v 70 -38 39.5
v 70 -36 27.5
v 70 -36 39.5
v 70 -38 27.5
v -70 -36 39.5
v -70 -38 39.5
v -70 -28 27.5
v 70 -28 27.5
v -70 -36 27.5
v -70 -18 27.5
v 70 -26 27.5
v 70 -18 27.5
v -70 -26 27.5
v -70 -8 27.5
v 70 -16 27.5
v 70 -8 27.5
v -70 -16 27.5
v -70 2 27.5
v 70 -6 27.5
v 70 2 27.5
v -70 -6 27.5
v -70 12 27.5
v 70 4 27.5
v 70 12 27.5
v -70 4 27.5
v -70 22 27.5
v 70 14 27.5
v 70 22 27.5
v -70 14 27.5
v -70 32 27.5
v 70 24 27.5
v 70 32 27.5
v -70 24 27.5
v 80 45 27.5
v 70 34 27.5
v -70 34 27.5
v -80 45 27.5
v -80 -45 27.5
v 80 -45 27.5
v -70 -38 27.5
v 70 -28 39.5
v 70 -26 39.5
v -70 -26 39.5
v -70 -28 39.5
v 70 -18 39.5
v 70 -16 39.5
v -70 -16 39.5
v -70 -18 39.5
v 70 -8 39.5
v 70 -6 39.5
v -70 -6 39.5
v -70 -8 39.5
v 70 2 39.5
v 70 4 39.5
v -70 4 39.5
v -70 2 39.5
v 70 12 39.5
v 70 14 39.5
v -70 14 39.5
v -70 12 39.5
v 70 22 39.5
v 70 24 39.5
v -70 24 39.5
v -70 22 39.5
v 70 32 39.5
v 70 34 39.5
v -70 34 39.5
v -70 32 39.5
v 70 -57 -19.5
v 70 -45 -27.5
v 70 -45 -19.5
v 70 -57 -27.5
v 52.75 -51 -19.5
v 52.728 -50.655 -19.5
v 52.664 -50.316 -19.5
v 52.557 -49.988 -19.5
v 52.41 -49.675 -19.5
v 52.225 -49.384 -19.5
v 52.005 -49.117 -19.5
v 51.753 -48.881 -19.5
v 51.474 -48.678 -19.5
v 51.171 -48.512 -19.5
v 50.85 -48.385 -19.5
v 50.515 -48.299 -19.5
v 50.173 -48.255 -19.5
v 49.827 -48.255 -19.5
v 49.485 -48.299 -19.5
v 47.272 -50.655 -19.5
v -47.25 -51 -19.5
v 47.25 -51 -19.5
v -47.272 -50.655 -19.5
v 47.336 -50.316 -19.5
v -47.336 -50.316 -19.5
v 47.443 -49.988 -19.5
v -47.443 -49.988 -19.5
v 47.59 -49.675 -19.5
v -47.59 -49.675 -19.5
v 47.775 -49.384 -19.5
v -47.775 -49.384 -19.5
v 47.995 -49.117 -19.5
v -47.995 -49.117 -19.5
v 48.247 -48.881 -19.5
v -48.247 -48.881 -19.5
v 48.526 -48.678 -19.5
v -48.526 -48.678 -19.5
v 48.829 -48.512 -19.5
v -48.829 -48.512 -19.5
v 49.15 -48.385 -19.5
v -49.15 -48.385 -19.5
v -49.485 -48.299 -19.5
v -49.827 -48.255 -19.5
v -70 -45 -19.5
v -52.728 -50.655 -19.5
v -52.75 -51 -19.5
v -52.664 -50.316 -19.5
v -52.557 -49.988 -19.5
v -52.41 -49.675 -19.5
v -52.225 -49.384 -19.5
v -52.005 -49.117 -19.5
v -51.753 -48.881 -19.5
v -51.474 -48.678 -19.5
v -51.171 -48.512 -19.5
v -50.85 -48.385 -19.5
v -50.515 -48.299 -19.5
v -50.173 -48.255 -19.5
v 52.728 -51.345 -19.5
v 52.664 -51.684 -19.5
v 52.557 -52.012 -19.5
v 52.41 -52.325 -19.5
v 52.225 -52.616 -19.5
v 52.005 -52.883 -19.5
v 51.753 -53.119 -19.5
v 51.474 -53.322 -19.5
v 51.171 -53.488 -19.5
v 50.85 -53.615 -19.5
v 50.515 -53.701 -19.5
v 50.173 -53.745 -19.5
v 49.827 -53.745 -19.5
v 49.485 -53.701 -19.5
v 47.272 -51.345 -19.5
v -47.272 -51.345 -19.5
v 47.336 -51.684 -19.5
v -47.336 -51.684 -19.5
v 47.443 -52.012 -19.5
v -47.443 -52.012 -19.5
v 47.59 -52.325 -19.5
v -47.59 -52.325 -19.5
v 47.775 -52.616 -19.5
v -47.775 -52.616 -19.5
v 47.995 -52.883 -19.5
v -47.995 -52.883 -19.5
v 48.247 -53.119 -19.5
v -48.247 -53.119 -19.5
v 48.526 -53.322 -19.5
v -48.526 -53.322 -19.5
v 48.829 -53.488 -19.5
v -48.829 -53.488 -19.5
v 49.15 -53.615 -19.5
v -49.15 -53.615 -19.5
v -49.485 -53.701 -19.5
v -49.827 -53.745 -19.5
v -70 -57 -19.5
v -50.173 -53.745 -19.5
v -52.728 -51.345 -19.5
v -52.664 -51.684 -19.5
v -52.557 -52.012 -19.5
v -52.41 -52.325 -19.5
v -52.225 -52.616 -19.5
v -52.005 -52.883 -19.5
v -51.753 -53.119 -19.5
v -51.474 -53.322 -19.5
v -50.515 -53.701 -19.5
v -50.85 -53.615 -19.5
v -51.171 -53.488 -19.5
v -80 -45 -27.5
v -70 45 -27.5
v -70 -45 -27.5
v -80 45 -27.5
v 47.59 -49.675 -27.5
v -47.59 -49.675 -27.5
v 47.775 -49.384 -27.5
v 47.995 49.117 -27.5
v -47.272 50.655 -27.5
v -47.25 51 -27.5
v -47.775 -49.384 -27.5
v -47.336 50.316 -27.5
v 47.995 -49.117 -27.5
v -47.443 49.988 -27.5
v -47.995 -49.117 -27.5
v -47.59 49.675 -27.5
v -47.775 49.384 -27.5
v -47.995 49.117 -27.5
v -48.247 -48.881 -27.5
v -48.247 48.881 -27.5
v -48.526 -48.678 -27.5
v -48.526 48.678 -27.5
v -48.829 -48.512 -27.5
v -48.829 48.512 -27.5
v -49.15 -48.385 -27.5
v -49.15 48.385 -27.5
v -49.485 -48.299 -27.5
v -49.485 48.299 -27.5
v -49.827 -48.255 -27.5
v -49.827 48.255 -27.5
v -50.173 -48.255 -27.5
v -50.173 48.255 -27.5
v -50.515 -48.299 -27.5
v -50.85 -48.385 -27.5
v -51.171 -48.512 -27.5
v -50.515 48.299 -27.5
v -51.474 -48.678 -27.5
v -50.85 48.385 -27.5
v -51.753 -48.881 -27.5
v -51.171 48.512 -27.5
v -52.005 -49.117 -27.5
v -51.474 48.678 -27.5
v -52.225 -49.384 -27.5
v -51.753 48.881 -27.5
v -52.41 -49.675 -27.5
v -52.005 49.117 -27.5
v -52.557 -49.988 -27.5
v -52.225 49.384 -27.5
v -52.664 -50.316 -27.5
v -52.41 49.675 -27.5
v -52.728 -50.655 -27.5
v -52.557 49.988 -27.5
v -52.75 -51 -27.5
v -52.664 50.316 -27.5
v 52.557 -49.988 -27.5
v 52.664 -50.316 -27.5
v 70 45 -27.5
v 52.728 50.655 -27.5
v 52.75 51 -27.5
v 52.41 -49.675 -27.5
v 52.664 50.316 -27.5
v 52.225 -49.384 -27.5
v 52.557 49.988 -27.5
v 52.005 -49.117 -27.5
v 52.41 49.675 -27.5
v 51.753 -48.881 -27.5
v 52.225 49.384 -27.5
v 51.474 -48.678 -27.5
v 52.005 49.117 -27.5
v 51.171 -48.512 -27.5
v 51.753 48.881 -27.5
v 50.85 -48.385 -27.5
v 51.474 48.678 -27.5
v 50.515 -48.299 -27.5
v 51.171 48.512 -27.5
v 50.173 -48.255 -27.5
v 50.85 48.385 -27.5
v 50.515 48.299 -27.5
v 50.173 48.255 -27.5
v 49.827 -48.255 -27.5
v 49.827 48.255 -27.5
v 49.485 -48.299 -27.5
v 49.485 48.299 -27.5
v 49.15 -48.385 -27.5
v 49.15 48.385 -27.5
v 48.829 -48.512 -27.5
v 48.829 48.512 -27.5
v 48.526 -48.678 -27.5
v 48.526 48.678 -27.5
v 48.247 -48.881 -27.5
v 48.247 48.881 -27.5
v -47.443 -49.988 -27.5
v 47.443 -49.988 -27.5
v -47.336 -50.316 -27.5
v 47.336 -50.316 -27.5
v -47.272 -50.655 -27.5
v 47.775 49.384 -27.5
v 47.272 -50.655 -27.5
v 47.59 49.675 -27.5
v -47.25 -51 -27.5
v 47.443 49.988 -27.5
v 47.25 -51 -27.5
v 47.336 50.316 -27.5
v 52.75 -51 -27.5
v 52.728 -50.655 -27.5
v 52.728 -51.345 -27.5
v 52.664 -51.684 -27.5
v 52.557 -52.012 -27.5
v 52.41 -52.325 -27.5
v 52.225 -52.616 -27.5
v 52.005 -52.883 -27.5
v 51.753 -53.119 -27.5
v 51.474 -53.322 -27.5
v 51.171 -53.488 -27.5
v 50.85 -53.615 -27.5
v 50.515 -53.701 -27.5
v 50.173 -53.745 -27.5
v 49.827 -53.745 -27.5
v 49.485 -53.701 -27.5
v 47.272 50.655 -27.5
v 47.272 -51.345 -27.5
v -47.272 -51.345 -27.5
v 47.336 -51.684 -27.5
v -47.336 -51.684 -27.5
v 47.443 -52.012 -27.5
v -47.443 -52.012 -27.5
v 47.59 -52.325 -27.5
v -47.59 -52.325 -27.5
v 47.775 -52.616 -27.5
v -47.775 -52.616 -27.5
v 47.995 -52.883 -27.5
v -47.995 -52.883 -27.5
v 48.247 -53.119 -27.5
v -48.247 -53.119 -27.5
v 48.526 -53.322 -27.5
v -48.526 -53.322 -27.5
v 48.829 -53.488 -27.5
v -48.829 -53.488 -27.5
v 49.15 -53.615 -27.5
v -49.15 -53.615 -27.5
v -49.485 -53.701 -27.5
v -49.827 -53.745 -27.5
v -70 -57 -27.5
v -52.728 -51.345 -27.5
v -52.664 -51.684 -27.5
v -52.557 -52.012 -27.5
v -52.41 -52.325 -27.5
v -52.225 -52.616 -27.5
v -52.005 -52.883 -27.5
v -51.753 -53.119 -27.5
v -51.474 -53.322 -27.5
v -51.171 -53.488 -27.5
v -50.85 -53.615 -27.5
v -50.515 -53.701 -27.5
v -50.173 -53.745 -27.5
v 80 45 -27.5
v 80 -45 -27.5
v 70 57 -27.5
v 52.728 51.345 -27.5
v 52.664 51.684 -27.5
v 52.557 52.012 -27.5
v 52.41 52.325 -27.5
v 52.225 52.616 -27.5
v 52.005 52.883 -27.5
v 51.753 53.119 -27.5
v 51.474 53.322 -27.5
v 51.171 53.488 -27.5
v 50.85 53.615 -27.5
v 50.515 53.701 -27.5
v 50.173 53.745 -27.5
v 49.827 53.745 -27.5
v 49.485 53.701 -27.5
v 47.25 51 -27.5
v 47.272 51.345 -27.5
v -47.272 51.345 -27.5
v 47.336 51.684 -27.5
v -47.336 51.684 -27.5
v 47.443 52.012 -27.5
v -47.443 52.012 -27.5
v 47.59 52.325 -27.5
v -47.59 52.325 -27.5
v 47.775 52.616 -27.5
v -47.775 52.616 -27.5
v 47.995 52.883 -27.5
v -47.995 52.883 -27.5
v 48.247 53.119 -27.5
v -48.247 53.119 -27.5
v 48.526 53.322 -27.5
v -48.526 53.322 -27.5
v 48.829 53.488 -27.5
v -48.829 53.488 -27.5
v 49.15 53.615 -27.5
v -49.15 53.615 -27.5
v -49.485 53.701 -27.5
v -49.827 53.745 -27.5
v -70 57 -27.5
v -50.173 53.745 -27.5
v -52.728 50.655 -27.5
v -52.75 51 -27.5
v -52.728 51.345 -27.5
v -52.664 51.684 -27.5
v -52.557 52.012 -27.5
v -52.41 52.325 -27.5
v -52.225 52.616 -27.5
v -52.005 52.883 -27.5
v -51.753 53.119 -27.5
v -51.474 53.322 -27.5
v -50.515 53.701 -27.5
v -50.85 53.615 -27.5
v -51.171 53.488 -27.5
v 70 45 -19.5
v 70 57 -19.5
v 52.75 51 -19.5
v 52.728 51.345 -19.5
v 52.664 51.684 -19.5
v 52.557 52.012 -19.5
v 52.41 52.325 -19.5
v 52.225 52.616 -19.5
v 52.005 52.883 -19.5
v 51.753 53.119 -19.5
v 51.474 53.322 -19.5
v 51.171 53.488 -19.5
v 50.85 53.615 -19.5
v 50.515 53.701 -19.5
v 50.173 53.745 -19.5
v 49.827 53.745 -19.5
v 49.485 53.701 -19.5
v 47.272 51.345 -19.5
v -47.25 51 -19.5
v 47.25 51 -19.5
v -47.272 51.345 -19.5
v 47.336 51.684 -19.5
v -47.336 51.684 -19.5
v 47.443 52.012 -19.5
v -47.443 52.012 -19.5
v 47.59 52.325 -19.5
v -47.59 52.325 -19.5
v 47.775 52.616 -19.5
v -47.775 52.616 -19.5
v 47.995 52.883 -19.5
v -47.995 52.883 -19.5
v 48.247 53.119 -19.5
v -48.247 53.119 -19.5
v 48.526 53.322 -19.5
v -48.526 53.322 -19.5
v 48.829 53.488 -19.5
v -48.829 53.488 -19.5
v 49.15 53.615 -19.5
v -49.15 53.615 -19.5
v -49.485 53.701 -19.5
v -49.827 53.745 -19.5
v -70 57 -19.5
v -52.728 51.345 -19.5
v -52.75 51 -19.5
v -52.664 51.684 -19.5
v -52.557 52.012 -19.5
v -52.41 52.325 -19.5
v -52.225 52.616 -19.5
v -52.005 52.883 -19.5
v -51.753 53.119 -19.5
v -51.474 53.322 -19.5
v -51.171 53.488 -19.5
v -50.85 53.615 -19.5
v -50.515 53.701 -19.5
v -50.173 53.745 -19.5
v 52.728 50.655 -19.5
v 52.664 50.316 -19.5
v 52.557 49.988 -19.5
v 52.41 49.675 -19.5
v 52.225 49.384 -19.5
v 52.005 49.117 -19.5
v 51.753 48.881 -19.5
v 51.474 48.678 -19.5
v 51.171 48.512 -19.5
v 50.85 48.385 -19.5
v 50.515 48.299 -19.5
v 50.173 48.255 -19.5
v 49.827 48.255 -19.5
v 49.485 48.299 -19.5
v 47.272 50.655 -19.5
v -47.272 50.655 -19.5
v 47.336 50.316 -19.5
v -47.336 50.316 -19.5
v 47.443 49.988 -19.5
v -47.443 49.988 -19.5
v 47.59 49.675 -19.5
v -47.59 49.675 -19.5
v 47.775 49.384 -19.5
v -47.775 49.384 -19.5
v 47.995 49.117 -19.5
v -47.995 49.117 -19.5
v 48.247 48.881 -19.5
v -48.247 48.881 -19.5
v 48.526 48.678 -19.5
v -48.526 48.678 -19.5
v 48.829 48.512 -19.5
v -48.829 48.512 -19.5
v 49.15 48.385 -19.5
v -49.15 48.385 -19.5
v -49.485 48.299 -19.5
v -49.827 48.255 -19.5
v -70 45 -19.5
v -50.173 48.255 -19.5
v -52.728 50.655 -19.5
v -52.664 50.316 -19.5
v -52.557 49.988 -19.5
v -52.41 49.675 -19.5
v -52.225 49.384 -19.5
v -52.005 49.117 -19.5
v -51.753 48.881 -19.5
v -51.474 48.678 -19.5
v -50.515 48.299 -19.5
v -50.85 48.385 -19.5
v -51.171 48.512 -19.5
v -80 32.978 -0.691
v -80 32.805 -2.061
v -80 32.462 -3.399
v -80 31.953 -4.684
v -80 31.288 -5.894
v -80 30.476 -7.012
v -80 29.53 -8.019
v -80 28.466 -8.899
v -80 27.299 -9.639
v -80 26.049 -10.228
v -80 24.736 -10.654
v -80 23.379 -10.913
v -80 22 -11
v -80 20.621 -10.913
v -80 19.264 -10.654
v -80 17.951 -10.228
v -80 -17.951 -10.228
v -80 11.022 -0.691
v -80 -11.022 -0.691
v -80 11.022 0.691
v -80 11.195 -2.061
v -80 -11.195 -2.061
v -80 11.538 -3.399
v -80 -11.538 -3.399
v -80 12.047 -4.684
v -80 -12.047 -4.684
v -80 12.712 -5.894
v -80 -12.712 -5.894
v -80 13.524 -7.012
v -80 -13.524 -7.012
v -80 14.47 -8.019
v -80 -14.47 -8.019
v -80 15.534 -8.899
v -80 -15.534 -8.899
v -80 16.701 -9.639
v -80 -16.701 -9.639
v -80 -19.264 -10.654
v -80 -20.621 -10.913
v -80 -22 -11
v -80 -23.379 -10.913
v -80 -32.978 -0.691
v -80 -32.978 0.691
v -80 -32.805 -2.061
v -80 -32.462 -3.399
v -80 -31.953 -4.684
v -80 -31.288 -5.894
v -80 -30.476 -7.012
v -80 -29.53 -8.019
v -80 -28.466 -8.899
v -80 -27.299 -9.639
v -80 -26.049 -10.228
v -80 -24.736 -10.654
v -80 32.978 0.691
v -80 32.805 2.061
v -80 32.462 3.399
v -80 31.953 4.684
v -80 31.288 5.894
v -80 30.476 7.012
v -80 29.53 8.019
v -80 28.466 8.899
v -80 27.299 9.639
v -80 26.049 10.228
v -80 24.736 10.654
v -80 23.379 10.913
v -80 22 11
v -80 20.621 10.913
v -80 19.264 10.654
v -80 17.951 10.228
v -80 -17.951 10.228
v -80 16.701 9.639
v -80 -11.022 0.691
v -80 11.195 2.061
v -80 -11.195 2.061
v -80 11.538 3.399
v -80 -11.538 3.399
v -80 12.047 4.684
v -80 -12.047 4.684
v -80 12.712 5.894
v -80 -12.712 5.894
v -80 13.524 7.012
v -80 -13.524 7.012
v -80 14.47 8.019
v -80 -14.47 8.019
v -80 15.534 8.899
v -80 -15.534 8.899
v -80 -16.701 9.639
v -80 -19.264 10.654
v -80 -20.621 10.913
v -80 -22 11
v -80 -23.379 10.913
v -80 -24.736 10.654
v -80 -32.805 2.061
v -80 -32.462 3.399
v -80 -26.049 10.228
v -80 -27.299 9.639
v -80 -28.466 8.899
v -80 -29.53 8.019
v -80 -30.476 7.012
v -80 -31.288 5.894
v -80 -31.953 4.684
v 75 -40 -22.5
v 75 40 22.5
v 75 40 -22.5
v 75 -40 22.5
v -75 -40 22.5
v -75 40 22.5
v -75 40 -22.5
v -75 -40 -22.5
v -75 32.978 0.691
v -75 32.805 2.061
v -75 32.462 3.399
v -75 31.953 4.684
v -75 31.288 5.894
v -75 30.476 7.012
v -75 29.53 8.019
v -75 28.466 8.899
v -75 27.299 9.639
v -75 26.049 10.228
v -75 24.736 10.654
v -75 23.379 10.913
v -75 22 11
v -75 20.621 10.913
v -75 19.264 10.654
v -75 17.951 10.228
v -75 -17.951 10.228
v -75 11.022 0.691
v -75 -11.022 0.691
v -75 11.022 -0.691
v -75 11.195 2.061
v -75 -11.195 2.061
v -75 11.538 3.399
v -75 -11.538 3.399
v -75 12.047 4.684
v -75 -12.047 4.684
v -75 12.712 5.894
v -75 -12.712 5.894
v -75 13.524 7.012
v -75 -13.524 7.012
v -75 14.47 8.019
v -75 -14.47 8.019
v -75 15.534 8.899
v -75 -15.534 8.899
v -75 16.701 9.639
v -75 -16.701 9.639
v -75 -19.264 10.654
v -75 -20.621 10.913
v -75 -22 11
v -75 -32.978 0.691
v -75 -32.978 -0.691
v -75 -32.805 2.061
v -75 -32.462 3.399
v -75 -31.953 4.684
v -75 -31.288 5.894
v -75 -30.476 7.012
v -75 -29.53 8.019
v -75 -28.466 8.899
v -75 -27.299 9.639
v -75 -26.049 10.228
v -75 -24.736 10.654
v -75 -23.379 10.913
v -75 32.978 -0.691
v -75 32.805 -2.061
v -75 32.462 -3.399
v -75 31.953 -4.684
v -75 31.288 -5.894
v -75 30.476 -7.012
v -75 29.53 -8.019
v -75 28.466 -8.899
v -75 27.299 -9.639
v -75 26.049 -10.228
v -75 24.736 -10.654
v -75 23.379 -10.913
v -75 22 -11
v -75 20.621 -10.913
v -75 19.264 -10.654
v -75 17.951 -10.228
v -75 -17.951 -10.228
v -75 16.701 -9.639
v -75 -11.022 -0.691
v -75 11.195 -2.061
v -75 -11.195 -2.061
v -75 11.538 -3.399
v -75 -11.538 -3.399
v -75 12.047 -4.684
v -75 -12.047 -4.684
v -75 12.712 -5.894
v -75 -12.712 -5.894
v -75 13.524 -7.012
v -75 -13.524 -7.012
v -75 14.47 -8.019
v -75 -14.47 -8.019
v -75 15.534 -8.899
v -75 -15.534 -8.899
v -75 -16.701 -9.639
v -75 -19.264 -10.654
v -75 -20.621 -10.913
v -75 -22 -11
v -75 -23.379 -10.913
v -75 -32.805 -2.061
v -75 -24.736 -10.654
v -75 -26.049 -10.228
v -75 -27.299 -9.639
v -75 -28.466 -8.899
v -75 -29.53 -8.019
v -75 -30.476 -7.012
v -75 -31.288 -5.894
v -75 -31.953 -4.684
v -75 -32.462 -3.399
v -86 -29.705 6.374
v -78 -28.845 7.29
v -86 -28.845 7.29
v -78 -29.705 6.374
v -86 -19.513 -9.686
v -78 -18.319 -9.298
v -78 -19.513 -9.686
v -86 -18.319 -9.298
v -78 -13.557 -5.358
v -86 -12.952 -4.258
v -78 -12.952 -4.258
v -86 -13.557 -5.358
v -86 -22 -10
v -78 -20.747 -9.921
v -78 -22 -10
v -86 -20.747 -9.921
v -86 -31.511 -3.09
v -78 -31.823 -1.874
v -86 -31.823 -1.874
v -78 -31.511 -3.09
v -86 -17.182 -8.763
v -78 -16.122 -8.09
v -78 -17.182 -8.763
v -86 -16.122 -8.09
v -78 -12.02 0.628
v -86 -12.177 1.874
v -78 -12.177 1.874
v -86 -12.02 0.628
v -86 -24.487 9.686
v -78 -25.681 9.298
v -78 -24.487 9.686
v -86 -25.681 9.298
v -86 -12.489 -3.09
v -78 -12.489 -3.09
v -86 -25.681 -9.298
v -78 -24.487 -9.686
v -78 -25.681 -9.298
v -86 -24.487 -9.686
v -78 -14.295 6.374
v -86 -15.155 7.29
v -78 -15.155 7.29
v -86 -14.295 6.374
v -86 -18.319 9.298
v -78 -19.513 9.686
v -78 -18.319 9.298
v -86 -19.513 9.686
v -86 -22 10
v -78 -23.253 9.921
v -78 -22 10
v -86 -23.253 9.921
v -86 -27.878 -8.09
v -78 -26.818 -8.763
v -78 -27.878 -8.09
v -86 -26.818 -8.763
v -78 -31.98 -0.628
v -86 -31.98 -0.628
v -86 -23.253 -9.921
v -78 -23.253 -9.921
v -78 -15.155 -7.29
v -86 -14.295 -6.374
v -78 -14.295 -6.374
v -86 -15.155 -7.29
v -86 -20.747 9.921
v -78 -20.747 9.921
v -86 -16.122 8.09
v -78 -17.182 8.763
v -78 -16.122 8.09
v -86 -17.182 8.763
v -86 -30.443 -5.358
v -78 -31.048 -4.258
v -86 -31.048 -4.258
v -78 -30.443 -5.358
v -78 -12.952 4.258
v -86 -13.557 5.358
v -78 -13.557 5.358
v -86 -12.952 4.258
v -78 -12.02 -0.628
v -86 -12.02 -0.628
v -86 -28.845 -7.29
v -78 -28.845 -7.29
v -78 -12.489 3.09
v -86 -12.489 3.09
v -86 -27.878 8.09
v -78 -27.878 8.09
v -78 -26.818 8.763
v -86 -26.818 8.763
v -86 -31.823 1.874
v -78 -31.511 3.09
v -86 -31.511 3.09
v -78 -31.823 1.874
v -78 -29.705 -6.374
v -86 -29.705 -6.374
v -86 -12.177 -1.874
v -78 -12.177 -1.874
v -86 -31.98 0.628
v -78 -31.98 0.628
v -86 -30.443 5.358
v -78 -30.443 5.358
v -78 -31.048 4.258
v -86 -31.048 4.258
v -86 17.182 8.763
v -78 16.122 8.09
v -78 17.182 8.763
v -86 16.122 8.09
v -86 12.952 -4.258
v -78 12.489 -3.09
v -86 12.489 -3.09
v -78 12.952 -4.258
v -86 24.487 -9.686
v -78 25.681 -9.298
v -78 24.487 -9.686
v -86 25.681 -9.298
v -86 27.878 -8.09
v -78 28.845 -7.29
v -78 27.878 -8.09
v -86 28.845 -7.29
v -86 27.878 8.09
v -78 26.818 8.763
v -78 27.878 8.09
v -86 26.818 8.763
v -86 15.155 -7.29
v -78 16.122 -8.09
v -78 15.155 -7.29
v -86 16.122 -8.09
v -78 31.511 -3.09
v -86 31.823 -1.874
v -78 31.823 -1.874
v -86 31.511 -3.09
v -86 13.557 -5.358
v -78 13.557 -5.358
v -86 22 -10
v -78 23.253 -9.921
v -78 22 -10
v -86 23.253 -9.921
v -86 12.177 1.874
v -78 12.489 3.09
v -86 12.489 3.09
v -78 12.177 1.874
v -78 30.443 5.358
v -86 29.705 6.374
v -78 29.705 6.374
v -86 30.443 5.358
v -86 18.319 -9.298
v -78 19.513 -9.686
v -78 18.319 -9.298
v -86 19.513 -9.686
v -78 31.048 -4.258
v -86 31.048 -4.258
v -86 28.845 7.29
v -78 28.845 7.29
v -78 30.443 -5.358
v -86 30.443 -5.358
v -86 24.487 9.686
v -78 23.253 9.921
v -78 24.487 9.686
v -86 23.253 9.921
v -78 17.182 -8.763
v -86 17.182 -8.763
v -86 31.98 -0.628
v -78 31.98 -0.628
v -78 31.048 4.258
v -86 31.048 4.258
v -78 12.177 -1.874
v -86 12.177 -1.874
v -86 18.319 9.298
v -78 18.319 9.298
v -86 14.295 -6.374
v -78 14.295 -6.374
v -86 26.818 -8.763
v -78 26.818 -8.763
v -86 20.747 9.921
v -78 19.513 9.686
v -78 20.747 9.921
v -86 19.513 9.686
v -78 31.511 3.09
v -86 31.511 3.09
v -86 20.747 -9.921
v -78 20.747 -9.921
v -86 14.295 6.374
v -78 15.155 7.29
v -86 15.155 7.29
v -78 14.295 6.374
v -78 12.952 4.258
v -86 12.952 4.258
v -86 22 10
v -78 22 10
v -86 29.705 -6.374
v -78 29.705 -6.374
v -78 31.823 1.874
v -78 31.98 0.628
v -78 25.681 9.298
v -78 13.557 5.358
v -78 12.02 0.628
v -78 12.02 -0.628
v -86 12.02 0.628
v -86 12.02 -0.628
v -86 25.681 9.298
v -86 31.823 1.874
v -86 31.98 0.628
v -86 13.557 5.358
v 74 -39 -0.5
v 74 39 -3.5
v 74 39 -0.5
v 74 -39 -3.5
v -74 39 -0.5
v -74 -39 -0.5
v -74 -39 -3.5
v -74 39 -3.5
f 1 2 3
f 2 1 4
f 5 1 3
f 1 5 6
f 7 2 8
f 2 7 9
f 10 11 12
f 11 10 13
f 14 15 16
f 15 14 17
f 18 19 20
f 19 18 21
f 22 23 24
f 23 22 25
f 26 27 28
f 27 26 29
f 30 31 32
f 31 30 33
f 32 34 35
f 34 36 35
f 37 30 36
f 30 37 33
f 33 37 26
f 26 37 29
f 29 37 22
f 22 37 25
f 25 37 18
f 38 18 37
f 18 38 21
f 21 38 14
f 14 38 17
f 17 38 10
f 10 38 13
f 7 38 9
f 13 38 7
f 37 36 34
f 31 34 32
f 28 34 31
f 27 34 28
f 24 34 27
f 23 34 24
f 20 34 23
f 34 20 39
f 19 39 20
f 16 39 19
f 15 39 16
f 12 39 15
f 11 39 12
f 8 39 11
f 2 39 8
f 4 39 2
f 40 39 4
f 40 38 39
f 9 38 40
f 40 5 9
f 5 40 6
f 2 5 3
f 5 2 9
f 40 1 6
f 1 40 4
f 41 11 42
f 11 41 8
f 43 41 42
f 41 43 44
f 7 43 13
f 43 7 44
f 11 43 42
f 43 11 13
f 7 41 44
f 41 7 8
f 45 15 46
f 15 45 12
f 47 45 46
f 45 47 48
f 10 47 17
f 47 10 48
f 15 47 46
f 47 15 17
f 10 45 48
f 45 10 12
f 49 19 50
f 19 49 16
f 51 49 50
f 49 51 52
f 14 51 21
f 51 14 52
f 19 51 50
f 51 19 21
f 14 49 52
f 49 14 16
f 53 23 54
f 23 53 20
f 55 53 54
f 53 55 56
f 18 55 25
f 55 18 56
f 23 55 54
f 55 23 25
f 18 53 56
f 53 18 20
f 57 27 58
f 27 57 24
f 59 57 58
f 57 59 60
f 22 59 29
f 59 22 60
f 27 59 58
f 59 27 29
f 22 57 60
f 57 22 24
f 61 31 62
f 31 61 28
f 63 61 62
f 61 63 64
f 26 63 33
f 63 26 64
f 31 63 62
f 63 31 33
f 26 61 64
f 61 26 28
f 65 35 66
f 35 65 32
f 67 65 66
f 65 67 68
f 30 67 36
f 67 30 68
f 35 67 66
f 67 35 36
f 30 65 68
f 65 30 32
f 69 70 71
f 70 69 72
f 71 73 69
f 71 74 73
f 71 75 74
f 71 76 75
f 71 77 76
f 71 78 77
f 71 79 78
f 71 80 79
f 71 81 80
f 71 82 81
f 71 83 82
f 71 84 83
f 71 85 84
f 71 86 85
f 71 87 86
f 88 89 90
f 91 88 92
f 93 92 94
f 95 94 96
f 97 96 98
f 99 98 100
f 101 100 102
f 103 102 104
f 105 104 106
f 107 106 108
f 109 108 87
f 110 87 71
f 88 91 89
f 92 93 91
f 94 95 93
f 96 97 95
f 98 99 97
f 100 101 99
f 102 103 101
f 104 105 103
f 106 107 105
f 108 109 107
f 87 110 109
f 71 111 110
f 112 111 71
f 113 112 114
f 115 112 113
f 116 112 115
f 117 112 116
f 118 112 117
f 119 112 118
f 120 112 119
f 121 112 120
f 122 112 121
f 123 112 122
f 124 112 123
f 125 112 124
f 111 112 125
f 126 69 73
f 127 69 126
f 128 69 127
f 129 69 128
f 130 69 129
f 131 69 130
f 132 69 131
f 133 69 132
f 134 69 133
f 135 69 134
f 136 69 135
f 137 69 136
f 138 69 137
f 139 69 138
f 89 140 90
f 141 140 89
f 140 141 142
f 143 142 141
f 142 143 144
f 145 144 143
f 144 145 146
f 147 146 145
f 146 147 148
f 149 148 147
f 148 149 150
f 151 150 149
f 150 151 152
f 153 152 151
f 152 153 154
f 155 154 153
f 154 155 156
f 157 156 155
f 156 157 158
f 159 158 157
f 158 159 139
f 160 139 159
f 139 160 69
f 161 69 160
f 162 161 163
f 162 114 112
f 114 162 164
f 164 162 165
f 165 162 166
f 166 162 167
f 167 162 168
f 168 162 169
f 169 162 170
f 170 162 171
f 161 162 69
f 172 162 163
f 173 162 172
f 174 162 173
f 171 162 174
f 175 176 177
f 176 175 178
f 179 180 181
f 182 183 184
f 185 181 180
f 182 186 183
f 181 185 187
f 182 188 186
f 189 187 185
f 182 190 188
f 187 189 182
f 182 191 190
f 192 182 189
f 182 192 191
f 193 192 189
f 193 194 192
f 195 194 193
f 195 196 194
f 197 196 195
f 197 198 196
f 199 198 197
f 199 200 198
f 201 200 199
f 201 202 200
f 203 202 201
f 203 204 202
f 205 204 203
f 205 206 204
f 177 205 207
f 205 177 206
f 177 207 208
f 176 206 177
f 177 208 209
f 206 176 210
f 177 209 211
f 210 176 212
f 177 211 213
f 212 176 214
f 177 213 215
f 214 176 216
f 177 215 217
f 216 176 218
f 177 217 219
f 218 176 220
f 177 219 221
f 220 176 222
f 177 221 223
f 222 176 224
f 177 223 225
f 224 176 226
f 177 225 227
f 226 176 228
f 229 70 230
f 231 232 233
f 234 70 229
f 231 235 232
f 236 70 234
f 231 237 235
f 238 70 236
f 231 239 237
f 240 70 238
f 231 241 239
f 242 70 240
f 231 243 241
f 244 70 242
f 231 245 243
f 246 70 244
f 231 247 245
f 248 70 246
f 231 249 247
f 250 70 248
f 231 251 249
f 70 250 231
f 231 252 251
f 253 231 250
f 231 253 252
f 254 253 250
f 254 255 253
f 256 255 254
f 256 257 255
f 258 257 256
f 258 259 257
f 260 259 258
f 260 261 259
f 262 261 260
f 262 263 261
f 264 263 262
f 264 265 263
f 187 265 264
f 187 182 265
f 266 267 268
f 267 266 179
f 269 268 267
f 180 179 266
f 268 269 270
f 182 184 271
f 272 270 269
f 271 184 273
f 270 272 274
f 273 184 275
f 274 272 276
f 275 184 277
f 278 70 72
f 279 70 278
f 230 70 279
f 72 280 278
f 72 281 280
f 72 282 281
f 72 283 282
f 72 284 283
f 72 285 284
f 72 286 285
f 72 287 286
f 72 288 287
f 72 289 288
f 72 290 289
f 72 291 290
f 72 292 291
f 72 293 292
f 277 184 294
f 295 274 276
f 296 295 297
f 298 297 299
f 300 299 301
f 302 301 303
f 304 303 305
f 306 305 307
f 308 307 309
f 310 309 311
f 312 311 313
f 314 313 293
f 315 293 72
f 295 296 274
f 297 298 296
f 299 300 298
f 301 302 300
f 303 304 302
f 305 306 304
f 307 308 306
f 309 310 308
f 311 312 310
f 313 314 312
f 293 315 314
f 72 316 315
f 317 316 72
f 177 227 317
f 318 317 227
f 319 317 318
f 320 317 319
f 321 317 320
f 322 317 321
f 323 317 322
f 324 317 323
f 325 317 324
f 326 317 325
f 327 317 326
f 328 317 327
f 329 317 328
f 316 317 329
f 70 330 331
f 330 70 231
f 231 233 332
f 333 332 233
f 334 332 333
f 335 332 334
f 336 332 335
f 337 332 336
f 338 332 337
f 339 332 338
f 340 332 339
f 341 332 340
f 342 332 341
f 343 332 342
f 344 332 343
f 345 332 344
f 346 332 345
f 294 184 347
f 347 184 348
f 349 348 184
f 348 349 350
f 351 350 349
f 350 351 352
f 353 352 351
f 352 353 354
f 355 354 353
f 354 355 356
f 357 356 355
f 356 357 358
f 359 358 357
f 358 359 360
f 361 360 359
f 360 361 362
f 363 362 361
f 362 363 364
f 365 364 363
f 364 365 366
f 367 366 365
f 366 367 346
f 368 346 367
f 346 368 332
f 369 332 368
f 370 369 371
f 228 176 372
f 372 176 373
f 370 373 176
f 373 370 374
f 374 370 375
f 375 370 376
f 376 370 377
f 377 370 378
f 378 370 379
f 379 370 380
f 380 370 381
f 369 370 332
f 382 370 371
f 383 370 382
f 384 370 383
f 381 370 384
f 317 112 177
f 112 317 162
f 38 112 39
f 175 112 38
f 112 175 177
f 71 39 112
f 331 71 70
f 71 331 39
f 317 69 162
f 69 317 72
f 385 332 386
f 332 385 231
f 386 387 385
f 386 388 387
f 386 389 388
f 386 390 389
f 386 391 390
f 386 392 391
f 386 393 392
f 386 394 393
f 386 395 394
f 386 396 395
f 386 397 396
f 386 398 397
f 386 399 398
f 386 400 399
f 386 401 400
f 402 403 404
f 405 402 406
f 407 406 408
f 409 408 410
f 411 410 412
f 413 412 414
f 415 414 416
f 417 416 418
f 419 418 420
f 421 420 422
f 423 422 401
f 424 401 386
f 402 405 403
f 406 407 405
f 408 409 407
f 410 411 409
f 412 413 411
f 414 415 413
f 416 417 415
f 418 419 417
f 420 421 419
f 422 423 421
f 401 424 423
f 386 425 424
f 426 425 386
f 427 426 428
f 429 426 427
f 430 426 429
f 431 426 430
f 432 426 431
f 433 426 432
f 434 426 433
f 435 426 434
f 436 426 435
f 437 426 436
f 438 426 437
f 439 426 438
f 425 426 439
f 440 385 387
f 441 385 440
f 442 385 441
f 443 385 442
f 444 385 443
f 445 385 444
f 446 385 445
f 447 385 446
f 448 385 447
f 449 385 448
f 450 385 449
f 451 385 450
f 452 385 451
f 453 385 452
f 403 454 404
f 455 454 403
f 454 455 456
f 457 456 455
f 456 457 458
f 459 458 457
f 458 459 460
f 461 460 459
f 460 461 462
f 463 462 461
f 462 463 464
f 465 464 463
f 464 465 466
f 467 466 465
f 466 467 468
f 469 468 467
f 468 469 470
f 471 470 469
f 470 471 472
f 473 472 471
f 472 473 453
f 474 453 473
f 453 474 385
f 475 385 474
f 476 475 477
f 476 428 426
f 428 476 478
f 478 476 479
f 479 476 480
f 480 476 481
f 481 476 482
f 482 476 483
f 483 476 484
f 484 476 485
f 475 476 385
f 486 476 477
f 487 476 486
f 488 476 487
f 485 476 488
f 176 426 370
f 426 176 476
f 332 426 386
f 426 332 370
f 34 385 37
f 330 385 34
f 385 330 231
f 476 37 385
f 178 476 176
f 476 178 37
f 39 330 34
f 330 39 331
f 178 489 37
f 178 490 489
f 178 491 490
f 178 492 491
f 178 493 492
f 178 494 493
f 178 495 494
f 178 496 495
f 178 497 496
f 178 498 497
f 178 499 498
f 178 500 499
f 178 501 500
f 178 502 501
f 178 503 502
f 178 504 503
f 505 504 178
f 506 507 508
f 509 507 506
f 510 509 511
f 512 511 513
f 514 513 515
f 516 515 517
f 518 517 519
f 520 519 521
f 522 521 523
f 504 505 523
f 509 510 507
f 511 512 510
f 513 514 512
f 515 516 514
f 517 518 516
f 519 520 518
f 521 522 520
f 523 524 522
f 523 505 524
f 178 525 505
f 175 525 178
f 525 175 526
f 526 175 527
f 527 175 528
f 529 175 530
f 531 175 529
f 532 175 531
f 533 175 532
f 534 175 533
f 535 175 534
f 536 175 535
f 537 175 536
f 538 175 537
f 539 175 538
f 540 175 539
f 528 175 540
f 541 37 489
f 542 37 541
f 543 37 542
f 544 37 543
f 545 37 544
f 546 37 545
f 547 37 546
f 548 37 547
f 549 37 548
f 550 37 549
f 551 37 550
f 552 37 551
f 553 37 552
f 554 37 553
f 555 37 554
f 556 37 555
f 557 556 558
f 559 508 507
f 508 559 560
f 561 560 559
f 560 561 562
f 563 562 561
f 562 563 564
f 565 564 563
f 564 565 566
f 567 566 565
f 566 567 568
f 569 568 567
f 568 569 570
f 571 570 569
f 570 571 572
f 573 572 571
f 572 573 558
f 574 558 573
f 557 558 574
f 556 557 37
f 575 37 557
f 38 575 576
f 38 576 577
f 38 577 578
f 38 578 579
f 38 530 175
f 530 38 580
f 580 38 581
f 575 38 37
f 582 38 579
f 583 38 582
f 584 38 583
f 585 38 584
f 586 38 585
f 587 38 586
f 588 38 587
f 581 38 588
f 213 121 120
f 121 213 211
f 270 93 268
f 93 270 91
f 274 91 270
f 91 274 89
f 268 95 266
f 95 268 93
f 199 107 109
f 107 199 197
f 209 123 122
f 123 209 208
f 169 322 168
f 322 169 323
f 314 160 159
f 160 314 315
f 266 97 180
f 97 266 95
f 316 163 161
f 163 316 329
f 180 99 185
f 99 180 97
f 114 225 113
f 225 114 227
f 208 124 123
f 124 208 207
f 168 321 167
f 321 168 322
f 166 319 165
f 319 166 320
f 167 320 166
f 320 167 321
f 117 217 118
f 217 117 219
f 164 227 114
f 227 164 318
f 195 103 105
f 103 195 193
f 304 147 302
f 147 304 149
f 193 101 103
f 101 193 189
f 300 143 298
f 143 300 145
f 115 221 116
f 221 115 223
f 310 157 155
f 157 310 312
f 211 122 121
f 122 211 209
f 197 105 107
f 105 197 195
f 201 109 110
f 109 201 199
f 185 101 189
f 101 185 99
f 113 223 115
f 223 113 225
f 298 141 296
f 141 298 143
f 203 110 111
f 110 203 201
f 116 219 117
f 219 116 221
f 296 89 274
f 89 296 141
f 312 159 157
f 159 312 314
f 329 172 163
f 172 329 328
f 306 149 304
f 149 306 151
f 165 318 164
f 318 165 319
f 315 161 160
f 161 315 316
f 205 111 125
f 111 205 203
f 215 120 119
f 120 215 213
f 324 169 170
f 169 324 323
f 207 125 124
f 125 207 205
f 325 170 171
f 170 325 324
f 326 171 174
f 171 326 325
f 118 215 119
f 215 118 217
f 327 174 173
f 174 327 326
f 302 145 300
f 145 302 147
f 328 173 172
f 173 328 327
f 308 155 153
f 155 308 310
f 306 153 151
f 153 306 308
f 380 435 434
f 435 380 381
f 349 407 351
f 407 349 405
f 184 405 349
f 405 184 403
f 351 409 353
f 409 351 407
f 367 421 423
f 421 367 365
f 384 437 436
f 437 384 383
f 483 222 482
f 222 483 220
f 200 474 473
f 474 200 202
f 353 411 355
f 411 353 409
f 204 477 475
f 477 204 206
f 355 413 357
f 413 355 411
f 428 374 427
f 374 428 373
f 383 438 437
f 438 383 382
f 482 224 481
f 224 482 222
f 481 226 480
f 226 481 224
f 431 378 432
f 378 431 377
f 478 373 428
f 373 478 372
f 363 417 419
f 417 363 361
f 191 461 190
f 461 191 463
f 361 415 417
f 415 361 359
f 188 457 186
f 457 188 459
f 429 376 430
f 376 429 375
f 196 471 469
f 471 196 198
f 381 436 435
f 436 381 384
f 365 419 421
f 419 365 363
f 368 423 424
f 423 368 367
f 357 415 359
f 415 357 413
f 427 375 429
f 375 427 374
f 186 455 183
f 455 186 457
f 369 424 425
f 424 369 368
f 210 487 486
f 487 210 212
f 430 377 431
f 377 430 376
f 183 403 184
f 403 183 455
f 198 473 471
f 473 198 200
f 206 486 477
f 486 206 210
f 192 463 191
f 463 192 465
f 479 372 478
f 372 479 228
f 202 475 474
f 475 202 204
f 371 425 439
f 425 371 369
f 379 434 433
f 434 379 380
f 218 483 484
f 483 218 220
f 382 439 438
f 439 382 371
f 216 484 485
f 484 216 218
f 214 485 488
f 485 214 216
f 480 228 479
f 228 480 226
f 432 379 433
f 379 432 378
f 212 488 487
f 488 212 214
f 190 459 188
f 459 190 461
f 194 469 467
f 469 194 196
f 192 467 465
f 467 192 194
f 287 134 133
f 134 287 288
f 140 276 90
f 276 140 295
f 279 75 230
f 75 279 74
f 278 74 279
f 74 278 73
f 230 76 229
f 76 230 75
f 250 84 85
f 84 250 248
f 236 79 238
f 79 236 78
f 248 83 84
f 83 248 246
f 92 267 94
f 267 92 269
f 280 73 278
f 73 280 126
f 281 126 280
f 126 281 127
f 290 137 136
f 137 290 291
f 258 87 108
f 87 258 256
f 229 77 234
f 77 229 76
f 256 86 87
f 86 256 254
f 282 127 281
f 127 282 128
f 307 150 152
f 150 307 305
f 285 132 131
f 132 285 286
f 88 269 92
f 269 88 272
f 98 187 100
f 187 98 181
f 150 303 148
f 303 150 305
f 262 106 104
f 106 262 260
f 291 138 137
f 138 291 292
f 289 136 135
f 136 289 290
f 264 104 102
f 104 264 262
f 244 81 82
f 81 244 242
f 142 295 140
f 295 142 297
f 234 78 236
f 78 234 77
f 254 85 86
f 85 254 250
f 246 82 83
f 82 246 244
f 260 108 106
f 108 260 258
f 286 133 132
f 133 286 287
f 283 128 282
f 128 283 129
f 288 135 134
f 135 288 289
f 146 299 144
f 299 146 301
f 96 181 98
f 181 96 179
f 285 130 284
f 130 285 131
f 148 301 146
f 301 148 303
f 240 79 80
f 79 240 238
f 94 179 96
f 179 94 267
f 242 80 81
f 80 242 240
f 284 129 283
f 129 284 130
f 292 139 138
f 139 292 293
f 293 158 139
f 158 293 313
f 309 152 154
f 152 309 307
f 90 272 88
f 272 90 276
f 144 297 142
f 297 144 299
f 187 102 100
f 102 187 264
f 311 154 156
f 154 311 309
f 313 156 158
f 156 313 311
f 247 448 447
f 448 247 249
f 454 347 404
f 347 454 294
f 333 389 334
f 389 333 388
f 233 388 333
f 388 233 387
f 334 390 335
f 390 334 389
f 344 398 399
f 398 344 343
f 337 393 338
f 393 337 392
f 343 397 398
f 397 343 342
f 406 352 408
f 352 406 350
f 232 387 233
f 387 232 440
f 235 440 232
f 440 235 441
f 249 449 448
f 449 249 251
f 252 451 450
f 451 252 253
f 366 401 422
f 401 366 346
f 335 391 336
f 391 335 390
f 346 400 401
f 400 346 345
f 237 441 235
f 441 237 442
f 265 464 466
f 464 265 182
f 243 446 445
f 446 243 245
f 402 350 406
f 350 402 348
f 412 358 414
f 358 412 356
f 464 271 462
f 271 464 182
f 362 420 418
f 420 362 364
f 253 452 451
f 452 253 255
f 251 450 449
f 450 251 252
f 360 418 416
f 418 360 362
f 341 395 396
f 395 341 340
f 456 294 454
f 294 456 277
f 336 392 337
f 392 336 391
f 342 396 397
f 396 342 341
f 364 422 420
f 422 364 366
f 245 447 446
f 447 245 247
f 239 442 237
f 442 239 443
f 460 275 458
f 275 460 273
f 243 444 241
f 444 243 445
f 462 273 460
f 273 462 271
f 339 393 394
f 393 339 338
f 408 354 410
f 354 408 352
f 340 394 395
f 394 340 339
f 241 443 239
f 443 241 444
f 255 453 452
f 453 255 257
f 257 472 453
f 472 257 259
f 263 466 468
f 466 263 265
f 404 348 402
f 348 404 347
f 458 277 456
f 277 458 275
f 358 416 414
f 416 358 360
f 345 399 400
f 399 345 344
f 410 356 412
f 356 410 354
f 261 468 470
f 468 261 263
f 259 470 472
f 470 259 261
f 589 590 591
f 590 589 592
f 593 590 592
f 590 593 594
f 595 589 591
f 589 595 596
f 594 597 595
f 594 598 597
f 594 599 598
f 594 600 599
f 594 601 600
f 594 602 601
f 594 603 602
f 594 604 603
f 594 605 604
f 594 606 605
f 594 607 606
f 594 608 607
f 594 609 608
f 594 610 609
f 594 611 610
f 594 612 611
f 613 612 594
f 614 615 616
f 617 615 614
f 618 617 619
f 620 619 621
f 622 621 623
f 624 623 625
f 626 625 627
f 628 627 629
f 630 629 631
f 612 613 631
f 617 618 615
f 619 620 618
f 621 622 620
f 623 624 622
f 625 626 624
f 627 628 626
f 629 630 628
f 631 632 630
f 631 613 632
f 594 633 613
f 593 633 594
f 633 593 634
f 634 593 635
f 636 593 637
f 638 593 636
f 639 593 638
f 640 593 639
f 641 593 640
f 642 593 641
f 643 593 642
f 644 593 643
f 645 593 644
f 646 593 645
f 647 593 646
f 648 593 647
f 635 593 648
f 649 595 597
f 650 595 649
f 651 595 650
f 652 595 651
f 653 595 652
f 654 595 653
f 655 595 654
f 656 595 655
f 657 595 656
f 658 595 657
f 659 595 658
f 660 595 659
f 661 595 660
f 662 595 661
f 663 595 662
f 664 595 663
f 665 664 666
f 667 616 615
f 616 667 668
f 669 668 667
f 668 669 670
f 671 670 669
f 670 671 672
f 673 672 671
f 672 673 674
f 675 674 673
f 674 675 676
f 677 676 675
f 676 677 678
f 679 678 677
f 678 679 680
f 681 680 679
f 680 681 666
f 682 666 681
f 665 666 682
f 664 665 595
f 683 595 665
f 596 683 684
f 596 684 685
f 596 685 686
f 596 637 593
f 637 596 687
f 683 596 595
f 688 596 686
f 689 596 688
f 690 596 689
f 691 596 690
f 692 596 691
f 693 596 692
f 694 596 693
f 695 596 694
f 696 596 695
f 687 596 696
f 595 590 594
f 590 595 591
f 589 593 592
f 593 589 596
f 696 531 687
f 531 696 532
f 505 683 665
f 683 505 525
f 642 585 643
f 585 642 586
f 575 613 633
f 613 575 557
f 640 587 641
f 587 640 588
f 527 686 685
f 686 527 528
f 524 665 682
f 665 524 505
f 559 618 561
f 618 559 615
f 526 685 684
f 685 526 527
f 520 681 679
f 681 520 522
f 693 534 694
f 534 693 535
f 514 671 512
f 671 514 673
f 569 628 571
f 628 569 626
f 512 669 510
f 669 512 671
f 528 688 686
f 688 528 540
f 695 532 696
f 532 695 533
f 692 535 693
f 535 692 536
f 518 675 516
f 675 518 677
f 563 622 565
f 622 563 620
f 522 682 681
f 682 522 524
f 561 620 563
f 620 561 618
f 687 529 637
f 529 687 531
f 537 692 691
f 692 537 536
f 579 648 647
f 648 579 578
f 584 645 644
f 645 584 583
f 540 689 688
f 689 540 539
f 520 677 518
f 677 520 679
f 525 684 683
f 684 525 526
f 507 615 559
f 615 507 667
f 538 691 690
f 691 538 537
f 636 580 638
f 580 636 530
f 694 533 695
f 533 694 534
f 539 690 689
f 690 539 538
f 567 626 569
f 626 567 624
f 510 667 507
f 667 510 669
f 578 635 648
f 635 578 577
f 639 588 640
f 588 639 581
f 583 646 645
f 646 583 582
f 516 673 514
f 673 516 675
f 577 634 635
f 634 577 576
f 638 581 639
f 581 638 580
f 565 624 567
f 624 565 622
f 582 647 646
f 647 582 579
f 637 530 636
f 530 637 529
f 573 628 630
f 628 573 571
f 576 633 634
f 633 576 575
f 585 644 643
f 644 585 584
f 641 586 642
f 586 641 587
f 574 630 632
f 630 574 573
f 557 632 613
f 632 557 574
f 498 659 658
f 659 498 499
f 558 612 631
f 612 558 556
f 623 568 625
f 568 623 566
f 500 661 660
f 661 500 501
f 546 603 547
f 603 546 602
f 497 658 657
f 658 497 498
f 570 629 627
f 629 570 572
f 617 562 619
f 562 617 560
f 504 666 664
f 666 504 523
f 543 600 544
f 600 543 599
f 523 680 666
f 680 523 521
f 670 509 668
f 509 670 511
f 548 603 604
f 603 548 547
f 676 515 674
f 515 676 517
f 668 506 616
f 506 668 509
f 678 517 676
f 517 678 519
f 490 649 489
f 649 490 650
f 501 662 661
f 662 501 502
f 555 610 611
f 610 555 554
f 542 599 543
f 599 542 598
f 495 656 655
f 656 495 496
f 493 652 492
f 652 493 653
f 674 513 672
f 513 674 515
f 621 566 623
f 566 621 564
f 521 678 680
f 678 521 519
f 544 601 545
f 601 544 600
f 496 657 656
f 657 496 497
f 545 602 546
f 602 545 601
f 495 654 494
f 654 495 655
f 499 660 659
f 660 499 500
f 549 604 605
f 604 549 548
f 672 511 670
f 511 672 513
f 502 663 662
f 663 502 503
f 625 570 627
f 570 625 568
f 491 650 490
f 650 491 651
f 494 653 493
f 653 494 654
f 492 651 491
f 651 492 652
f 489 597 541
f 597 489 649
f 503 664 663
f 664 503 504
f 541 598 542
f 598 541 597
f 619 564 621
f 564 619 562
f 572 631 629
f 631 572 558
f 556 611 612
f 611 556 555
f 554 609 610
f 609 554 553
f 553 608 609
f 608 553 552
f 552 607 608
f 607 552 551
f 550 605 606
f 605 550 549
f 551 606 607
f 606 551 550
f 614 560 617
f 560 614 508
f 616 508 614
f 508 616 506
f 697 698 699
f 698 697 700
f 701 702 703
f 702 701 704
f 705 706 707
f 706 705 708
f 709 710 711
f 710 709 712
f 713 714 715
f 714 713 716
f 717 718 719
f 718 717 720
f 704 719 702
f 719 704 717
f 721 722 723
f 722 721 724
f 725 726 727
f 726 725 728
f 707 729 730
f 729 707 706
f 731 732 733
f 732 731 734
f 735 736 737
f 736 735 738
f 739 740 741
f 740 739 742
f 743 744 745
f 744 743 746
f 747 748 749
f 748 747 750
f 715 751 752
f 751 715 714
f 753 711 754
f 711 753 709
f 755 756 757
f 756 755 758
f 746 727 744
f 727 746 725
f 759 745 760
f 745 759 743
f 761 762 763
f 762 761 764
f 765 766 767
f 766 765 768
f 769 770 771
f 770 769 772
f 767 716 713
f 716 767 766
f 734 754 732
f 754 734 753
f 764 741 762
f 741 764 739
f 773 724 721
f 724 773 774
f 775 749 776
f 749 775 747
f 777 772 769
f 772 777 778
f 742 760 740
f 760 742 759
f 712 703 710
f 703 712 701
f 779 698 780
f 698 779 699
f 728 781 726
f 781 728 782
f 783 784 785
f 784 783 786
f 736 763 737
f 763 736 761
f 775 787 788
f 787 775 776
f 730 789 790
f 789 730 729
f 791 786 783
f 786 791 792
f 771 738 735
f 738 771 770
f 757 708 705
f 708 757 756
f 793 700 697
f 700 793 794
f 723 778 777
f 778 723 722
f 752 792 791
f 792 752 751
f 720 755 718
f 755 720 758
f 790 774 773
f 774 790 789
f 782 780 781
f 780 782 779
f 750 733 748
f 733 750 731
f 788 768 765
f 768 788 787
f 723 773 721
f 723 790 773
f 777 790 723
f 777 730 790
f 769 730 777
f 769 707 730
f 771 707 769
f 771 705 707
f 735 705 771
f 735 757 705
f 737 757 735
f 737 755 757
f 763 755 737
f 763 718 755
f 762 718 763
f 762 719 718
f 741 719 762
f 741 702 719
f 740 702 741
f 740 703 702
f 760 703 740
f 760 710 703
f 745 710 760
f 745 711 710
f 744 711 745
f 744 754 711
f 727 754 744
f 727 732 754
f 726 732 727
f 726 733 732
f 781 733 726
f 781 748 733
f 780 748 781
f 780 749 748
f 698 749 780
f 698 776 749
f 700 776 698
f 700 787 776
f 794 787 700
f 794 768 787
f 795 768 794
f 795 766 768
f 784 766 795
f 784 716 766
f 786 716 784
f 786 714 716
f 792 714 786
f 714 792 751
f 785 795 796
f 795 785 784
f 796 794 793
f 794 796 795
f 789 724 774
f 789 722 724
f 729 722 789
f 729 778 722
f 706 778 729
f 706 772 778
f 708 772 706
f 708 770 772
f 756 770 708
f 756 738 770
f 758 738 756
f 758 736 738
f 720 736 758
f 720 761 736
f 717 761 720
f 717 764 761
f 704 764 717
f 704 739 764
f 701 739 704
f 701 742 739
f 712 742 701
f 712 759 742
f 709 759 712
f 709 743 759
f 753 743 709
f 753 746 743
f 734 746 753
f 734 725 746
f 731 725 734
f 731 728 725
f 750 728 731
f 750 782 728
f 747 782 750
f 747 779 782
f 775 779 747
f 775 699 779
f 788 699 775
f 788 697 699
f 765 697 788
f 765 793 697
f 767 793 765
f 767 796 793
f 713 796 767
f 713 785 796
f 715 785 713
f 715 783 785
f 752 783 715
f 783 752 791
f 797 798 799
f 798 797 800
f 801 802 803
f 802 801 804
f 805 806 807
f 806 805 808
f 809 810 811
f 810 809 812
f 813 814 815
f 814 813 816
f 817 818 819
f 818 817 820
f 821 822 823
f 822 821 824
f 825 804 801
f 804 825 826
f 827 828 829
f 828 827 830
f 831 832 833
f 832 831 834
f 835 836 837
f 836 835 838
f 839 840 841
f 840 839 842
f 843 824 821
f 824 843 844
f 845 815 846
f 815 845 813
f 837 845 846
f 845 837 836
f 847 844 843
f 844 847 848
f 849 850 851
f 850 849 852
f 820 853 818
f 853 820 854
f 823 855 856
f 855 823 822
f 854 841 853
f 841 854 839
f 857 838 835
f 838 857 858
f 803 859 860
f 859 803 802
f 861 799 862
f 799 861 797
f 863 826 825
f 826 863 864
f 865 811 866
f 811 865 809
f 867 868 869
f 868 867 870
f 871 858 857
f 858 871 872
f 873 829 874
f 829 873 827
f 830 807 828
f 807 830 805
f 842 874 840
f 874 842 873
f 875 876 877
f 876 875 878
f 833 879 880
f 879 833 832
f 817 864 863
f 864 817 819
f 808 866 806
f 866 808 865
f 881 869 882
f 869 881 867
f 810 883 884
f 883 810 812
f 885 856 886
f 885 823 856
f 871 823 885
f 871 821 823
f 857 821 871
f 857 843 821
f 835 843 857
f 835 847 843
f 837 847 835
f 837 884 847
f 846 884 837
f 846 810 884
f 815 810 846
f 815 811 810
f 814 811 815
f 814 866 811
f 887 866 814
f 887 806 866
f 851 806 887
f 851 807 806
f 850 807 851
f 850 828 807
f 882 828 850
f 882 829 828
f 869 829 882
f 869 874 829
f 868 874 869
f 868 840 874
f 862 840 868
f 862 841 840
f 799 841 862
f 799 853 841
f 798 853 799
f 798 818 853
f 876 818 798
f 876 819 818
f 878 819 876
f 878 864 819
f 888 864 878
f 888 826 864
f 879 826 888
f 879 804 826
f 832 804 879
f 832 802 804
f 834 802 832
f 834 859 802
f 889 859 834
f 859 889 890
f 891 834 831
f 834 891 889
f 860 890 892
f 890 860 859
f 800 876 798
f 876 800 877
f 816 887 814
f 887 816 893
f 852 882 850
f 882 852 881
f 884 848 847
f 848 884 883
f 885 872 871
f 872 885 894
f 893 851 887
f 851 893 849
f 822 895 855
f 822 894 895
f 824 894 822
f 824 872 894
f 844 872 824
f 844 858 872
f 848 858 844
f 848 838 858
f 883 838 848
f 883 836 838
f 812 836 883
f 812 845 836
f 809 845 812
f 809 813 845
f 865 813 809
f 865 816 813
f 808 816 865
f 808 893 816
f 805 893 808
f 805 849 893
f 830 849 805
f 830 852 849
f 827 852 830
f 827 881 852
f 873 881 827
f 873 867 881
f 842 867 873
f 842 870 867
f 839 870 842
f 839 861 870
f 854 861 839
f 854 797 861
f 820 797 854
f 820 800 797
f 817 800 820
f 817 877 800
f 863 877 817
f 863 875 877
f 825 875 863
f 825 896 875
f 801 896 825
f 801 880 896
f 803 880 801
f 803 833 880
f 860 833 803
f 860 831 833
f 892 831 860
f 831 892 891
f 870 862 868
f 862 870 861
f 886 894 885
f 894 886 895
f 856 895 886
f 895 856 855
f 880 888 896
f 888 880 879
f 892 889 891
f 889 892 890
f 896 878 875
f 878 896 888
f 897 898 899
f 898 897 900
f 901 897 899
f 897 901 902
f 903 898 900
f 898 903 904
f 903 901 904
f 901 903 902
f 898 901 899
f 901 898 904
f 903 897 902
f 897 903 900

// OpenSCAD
// ========================================================
// F-14F RETROFIT KIT - COCKPIT POWER DISTRIBUTION SYSTEM
// EXPLOSION-PROOF SOLID-STATE REGULATOR HOUSING ASSEMBLY
// ========================================================

$fn = 50; // High-precision manufacturing corner smoothing

// --- COCKPIT FLOOR RIGHT FLANK SPACE ENVELOPE (mm) ---
block_length = 160; 
block_width  = 90;  
block_height = 55;  
wall_thick   = 5.0; // Reinforced armor wall thickness to fully contain internal faults

fin_h        = 12.0; // Thermal dissipation cooling fins height

// --- COLOR PALETTE ---
tactical_black = [0.15, 0.15, 0.16, 1.0]; // Non-reflective powder-coated armor finish
copper_bus     = [0.85, 0.45, 0.20, 1.0]; // High-current solid copper terminal lugs
conn_stainless = [0.80, 0.82, 0.85, 1.0]; // Sealed MIL-DTL-38999 circular input plugs
fr4_green      = [0.12, 0.44, 0.22, 0.4]; // Translucent view of interior circuit substrate

// ========================================================
// MECHANICAL COMPONENT GENERATION
// ========================================================

module cockpit_power_block_assembly() {
    // 1. Reference View: Internal Solid-State Isolation Circuitry
    color(fr4_green)
        translate([0, 0, -2])
        cube([block_length - 12, block_width - 12, 3], center=true);

    // 2. Heavy-Duty Armor Blast Shell (Milled 6061-T6 Aluminum billet)
    difference() {
        union() {
            // Main protective chassis core envelope
            color(tactical_black) 
                cube([block_length, block_width, block_height], center=true);
            
            // --- THERMAL MITIGATION: Integrated Cooling Fin Rails ---
            // Dissipates power step-down conversion heat without any noisy, high-failure fans
            color(tactical_black) {
                for (y_fin = [-block_width/2 + 8 : 10 : block_width/2 - 8]) {
                    translate([0, y_fin, block_height/2 + fin_h/2])
                        cube([block_length - 20, 2.0, fin_h], center=true);
                }
            }
            
            // Non-Destructive Side Mounting Slat Flanges
            // Fastens directly into the original right-hand console utility tracks
            color(tactical_black) {
                translate([0, -block_width/2 - 6, -block_height/2 + 4]) cube([block_length - 20, 12, 8], center=true);
                translate([0,  block_width/2 + 6, -block_height/2 + 4]) cube([block_length - 20, 12, 8], center=true);
            }
        }
        
        // Internal hollow component safety containment vault subtraction cavity
        cube([block_length - (wall_thick*2), block_width - (wall_thick*2), block_height - (wall_thick*2)], center=true);
        
        // Front wall punch-outs for the 28V DC input and dual 5V/12V output interface connectors
        translate([-block_length/2, -22, 0]) rotate([0, 90, 0]) cylinder(d=22, h=wall_thick * 3, center=true);
        translate([-block_length/2,  22, 0]) rotate([0, 90, 0]) cylinder(d=22, h=wall_thick * 3, center=true);
        
        // Counter-sunk mounting bolt holes on side flanges to anchor box with no drilling
        for (x_bolt = [-50, 50]) {
            translate([x_bolt, -block_width/2 - 6, -block_height/2 + 4]) cylinder(d=5.5, h=20, center=true);
            translate([x_bolt,  block_width/2 + 6, -block_height/2 + 4]) cylinder(d=5.5, h=20, center=true);
        }
    }
    
    // 3. Sealed Multi-Pin Stainless Connector Shell Ports
    color(conn_stainless) {
        translate([-block_length/2 - 2, -22, 0]) rotate([0, 90, 0]) cylinder(d=20, h=8, center=true); // 28V In
        translate([-block_length/2 - 2,  22, 0]) rotate([0, 90, 0]) cylinder(d=20, h=8, center=true); // Regulated Out
    }
}

// Execute active rendering tree module
cockpit_power_block_assembly();
